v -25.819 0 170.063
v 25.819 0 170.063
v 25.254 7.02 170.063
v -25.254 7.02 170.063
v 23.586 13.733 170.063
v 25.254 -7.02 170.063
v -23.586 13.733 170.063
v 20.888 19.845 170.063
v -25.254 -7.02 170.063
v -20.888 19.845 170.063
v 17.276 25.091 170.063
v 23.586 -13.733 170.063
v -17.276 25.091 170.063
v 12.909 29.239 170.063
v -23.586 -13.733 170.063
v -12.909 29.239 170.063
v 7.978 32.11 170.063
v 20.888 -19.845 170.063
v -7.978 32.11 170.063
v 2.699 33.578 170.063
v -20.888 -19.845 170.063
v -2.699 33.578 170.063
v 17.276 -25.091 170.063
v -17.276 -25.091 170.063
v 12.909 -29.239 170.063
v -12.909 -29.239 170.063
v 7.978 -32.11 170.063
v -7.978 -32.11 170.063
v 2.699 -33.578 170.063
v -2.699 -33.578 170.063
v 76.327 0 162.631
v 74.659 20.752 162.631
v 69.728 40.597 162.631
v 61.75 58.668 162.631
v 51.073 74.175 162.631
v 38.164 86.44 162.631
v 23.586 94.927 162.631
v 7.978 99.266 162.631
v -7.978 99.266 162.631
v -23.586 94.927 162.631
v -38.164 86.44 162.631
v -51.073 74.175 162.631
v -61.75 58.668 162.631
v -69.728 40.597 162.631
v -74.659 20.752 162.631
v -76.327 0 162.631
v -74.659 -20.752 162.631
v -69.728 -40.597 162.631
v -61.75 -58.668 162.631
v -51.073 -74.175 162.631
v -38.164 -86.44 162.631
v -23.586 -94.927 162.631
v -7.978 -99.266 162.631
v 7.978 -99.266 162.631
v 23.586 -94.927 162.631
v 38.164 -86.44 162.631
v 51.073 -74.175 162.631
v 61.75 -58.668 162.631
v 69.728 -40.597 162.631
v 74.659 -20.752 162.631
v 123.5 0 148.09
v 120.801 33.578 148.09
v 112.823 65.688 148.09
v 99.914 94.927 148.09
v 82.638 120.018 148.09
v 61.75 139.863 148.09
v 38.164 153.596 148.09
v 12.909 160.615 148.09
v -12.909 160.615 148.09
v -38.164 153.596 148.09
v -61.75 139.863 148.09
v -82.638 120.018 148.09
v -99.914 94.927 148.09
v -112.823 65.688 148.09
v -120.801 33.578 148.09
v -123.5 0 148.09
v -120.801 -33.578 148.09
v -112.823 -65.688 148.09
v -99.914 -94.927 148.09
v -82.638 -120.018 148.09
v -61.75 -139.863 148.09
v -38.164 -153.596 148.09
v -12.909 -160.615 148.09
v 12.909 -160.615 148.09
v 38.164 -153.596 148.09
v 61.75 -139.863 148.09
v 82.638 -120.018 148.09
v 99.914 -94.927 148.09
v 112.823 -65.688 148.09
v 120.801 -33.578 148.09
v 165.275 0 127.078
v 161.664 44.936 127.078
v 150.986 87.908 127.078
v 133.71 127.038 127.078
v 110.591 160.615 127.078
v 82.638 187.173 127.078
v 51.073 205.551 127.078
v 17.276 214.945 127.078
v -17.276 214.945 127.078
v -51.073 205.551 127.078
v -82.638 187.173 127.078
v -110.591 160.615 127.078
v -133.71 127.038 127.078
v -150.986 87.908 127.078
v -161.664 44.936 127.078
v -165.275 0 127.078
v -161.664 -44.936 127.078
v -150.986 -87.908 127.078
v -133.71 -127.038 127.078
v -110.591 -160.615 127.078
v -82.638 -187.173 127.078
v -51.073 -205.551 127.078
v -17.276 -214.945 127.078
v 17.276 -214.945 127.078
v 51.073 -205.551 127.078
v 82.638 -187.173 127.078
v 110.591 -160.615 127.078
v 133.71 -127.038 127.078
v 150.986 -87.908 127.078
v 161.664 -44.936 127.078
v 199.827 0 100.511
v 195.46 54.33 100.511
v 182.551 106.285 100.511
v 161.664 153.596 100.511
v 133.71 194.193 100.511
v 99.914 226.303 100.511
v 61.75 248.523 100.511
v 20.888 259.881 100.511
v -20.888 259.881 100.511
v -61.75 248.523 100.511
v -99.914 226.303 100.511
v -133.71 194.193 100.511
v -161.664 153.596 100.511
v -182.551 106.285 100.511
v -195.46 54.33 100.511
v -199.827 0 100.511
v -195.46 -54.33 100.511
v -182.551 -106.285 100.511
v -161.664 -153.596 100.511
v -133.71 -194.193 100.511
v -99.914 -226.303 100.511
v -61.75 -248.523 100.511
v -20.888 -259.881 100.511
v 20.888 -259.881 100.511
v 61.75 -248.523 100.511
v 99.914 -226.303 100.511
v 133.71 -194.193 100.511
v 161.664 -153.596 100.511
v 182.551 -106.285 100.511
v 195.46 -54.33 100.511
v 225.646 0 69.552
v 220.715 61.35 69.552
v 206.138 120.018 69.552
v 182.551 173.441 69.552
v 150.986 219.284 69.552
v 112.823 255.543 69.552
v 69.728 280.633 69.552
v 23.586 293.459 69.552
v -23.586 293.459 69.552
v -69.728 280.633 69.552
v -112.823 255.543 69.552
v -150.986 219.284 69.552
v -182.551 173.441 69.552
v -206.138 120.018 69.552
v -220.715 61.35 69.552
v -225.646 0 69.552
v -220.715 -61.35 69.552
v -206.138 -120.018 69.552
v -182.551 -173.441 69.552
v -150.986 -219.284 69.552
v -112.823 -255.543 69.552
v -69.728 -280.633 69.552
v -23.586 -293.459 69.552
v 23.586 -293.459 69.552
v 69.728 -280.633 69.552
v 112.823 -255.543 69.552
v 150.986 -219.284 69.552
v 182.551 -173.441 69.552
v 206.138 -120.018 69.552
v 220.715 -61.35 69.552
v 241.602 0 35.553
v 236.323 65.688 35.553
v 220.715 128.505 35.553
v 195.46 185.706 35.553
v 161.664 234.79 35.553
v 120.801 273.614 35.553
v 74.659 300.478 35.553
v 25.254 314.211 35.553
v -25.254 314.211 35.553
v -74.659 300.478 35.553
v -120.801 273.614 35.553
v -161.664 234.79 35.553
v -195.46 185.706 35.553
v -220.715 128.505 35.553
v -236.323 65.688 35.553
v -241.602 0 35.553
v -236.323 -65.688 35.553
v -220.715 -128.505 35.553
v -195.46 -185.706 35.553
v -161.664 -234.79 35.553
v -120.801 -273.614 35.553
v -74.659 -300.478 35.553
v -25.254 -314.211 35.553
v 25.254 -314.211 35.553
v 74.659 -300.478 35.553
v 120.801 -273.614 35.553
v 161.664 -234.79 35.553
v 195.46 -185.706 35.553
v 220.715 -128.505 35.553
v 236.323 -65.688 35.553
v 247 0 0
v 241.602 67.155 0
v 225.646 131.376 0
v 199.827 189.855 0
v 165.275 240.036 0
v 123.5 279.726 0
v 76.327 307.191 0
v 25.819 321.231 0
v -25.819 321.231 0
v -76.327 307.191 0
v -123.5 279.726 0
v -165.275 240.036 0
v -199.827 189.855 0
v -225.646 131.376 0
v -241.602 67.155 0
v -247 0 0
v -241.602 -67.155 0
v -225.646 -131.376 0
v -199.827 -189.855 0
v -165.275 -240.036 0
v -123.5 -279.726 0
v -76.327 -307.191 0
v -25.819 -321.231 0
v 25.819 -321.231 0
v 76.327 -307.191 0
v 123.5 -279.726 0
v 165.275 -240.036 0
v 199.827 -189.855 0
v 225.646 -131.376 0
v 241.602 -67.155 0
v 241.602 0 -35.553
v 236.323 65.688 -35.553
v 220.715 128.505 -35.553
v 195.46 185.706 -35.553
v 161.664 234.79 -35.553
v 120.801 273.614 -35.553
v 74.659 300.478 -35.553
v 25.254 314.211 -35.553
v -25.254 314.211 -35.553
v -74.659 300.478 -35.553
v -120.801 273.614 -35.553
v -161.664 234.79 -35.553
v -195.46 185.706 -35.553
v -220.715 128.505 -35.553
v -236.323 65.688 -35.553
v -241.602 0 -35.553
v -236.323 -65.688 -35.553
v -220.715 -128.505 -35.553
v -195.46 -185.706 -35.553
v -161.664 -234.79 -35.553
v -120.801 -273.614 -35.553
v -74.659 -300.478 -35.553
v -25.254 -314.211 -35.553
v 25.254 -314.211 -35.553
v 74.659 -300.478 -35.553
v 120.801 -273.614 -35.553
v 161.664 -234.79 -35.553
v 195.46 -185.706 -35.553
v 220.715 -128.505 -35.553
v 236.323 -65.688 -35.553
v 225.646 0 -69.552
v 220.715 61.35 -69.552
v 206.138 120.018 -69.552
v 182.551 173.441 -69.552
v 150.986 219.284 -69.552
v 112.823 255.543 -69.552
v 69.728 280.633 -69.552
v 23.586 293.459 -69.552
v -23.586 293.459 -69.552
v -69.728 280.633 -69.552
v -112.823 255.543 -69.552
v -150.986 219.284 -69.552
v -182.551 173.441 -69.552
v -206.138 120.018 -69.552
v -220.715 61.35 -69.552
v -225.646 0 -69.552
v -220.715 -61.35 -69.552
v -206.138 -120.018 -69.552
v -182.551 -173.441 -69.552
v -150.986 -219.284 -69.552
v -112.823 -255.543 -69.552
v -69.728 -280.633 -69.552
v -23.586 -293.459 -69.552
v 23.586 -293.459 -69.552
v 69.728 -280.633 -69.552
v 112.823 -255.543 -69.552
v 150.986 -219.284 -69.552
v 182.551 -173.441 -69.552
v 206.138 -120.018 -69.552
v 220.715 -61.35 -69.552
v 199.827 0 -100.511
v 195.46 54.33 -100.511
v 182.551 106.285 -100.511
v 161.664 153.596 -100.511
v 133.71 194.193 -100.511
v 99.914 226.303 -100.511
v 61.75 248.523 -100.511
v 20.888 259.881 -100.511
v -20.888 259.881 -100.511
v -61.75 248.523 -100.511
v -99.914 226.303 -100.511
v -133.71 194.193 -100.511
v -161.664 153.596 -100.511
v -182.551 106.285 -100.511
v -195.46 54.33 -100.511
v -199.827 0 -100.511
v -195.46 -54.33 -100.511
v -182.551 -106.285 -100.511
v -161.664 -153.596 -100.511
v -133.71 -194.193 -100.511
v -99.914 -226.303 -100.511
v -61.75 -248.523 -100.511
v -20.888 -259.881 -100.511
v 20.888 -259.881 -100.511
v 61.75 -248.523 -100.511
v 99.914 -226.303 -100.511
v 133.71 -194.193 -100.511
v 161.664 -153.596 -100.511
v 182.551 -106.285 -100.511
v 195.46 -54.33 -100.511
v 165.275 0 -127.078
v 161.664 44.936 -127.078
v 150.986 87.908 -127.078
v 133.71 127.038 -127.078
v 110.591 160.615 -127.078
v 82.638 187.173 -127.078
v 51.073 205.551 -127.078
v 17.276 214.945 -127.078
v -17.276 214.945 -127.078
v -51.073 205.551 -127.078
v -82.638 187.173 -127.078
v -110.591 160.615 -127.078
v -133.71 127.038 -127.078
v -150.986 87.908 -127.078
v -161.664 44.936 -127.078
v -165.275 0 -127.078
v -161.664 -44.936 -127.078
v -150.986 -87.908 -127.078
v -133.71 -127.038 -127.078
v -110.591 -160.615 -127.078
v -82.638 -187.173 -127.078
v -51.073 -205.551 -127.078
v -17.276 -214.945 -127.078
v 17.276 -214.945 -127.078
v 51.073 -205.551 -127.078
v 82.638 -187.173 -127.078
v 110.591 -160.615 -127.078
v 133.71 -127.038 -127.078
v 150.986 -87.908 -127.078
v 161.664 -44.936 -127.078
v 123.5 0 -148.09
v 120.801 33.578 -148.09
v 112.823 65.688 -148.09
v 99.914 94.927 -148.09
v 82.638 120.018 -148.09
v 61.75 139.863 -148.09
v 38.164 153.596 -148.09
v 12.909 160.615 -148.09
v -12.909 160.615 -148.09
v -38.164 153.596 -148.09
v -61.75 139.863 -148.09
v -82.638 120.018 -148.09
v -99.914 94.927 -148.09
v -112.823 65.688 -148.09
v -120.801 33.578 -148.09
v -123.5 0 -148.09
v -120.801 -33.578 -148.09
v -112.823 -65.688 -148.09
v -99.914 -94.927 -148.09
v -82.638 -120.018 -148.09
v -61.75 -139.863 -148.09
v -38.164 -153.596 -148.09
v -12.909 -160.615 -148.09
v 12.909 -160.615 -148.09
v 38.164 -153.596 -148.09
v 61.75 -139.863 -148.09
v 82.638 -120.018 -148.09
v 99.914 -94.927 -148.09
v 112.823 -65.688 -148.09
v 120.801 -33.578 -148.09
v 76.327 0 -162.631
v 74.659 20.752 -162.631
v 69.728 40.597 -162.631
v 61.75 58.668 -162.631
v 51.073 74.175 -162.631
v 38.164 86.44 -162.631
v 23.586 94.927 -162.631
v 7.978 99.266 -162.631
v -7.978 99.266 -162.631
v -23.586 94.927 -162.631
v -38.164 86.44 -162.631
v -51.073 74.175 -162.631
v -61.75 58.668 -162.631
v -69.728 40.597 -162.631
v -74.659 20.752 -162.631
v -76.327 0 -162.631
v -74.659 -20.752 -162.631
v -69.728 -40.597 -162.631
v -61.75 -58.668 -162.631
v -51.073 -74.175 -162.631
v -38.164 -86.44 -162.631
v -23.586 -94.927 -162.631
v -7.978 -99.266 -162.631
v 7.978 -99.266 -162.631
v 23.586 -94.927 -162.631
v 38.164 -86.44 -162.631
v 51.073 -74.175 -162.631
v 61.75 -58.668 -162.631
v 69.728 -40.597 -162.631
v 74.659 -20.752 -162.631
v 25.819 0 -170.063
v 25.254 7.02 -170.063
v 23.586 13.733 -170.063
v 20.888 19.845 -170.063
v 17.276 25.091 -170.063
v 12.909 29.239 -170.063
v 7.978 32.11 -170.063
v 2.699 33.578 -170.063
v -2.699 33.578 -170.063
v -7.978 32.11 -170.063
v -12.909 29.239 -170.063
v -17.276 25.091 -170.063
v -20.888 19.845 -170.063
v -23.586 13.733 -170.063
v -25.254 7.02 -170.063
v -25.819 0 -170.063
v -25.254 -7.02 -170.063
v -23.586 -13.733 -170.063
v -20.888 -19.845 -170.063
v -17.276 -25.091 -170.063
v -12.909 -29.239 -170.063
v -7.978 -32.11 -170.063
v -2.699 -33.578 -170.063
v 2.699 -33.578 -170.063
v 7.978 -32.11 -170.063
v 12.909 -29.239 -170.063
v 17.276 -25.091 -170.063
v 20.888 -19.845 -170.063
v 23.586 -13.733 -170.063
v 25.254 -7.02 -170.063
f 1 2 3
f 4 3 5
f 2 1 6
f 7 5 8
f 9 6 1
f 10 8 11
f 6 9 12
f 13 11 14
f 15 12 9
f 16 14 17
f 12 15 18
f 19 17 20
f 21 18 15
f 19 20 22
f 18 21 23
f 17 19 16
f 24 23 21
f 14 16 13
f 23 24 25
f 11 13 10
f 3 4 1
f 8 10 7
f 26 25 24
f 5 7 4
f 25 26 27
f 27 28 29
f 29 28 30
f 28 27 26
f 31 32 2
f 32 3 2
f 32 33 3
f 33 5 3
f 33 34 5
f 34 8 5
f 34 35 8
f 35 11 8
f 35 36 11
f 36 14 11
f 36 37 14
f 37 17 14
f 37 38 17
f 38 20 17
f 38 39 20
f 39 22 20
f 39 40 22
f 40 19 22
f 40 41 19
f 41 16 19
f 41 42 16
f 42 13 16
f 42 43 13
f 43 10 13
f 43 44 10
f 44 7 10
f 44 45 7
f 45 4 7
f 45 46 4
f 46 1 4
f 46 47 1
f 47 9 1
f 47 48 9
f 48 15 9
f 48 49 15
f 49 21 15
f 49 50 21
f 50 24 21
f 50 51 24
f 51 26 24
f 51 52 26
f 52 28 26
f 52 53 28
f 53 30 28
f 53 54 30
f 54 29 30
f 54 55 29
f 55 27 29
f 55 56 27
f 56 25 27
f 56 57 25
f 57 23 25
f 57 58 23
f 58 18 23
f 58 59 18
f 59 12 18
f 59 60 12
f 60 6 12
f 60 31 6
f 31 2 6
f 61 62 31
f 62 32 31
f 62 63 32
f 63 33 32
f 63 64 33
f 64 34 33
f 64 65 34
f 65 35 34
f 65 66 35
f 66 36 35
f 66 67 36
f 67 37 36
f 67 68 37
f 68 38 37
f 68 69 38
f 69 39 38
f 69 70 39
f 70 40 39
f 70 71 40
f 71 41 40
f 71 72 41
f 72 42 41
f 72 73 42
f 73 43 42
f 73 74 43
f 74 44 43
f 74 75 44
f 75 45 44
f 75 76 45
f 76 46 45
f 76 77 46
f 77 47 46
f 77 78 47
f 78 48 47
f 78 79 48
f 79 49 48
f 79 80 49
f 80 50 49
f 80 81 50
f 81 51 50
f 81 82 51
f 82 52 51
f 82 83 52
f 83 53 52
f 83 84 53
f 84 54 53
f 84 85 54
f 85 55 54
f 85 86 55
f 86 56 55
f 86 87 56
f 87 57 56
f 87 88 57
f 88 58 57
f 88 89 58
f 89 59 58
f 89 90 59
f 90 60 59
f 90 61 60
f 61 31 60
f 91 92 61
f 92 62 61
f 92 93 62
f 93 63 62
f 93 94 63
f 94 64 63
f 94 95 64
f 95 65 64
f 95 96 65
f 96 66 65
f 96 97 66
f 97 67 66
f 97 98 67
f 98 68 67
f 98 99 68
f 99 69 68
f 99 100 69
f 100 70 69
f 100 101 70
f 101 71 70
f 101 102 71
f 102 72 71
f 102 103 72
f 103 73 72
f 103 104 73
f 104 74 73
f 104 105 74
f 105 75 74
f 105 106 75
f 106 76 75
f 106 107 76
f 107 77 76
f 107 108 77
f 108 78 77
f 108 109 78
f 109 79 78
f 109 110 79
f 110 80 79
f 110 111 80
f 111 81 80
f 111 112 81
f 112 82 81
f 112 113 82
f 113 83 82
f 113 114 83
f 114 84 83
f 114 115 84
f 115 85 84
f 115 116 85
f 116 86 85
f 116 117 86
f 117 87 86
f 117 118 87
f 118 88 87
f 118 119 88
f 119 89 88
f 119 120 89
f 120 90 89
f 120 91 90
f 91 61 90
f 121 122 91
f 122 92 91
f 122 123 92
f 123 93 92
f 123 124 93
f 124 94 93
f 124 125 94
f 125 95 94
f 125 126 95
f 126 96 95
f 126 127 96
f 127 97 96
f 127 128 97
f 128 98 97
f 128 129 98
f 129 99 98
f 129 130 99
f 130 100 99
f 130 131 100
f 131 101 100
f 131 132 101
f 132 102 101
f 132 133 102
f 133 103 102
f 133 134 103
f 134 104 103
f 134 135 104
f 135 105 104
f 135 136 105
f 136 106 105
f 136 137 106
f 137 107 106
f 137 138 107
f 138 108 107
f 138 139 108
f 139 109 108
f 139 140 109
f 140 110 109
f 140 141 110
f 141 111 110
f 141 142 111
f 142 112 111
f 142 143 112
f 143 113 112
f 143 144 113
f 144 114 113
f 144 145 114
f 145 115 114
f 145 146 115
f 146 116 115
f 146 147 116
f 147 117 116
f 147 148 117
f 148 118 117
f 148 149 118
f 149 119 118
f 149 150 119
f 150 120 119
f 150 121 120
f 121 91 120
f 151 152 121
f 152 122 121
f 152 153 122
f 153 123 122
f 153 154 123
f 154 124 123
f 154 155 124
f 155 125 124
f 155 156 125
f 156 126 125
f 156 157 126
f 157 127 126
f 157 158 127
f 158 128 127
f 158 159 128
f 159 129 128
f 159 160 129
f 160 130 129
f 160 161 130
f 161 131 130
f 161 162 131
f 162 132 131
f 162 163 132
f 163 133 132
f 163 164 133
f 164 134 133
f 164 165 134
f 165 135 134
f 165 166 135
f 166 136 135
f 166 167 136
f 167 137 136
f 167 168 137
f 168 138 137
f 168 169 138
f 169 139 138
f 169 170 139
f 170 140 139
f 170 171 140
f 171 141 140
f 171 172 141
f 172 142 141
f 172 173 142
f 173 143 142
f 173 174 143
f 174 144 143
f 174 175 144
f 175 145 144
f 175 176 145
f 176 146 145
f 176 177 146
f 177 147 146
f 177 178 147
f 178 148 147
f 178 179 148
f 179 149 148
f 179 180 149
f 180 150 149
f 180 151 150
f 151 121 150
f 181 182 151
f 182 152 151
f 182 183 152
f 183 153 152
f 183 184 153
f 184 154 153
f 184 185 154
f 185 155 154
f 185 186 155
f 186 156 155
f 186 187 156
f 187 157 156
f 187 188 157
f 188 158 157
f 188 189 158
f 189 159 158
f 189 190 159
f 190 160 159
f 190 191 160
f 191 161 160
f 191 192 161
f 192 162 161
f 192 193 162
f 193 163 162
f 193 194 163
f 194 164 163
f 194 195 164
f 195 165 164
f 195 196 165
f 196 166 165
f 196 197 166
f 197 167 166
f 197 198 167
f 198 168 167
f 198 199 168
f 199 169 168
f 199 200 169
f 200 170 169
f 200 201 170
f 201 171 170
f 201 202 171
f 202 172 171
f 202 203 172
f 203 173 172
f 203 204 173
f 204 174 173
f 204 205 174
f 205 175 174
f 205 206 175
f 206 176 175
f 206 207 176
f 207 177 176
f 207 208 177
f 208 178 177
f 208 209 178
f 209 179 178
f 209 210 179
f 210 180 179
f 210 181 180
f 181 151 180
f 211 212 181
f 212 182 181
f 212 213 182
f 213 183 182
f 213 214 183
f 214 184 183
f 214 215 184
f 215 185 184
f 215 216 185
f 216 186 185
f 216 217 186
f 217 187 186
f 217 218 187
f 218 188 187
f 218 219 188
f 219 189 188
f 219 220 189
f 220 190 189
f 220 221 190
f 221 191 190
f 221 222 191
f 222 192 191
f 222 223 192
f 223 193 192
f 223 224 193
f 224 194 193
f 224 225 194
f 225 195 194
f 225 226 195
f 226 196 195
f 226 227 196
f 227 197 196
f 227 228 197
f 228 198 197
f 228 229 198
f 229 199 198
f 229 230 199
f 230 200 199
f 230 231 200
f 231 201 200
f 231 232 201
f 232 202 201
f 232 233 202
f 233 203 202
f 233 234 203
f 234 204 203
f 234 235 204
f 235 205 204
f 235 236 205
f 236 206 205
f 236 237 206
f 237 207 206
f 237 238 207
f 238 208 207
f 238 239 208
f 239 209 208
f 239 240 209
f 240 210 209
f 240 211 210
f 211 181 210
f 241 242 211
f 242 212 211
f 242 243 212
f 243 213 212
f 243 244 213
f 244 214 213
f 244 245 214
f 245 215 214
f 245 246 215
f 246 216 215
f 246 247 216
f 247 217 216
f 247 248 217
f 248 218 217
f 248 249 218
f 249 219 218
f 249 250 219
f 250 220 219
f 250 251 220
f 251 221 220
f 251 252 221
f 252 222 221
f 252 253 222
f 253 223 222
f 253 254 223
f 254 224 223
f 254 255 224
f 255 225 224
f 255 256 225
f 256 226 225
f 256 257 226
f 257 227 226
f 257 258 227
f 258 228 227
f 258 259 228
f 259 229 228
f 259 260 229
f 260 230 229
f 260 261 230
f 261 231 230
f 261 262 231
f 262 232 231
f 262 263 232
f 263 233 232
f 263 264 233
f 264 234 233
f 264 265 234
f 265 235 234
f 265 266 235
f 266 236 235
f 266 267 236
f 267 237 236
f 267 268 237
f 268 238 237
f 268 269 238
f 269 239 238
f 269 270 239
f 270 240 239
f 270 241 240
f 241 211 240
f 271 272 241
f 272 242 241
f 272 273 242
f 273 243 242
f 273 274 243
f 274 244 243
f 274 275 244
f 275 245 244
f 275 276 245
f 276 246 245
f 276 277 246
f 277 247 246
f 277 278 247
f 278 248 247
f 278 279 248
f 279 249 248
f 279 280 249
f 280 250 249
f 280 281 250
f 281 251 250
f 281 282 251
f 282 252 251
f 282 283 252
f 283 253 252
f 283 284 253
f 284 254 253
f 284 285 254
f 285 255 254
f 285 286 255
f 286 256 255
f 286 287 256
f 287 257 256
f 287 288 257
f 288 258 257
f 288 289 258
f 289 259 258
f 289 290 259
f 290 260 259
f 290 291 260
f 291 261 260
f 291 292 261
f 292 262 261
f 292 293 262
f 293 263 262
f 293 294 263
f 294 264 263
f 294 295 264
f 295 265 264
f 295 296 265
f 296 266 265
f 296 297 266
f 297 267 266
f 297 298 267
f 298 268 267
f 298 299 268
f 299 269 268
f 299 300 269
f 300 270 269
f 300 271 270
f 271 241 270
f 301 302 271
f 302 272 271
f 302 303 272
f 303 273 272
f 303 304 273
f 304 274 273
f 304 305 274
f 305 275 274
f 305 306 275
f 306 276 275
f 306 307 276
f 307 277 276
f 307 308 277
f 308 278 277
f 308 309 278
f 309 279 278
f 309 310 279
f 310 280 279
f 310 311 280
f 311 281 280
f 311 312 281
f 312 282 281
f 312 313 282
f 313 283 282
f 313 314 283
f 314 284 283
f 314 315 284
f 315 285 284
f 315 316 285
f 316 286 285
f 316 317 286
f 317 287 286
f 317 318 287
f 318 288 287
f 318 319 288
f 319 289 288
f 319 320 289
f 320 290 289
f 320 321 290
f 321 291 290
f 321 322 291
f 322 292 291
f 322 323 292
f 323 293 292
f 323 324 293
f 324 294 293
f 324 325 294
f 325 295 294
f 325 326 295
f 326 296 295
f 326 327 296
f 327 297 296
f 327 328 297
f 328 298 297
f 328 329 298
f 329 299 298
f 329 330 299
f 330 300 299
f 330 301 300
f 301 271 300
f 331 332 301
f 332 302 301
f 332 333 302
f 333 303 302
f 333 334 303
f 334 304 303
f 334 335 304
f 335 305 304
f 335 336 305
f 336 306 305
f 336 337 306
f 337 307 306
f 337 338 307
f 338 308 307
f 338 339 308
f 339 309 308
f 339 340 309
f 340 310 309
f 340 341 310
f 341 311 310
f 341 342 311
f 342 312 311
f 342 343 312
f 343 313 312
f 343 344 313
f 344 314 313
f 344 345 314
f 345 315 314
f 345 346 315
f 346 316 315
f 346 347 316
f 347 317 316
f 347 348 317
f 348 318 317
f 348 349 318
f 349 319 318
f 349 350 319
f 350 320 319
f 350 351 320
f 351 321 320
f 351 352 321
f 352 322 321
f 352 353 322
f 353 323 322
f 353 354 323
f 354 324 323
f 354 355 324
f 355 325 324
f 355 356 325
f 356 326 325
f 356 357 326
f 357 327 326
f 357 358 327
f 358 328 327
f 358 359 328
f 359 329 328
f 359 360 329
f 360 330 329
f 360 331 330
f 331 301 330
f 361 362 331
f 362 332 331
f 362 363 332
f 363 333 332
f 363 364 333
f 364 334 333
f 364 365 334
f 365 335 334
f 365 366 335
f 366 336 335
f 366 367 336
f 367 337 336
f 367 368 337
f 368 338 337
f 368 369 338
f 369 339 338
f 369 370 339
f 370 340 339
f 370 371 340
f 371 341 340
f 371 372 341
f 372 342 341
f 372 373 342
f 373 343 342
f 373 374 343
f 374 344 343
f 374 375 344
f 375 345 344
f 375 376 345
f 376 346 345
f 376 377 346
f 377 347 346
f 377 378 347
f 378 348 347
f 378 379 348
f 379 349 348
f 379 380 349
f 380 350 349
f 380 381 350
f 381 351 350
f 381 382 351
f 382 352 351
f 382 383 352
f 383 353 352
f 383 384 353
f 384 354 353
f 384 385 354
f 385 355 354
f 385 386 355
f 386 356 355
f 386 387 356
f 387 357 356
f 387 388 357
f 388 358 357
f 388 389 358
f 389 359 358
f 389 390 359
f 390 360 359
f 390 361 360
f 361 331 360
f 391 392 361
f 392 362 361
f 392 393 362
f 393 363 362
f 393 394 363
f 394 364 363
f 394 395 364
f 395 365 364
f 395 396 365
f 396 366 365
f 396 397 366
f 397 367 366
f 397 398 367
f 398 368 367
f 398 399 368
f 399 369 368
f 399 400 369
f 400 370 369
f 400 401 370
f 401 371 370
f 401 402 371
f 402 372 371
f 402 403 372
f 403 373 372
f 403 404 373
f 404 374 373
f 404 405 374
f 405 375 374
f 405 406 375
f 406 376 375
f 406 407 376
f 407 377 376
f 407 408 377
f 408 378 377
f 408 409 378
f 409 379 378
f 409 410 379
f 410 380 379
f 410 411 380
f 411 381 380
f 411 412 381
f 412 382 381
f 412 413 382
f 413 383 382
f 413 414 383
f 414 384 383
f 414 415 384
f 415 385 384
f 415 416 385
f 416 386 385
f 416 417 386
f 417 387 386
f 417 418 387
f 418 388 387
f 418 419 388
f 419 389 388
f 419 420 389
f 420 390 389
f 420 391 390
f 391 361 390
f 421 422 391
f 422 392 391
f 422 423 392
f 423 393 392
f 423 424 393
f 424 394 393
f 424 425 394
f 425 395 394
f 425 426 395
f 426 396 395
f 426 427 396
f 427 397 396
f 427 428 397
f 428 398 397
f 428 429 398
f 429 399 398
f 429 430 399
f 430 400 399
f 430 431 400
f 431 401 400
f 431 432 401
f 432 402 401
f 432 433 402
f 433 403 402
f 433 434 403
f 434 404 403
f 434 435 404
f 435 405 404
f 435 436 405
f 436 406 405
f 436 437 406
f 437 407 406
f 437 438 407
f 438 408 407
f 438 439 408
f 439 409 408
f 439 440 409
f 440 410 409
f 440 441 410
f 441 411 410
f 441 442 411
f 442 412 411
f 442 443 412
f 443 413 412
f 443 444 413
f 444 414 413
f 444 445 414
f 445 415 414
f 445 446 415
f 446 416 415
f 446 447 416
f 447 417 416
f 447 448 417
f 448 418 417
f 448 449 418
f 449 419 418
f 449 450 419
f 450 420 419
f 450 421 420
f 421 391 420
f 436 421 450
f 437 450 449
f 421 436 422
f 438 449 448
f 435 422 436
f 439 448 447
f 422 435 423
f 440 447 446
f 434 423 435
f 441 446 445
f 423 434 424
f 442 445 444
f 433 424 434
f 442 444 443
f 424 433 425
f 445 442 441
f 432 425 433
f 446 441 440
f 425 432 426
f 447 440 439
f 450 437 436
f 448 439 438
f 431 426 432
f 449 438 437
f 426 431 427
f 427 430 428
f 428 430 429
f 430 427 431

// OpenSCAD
// Generated by SolidPython 1.0.1 on 2020-07-29 00:46:51


scale(v = [13, 17, 9]) {
	sphere(r = 19);
}
/***********************************************
*********      SolidPython code:      **********
************************************************
 
# import packages: SolidPython
from solid import *
from solid.utils import *
from itertools import chain, combinations, permutations


class Resize:

    def __init__(self, scad_file):
        self.scad_file = scad_file
        #self.scad_file = import_scad(scad_file)
        # cone/cylinder param:
        self.r1 = 0
        self.r2 = 0
        self.h = 0
        # rectangular prism param:
        self.w = 0
        self.l = 0
        # ellipse param:
        self.r = 0

    # import OpenScad code (file name corresponds to shape)


    # classify shape + parameters
    def assign(self, param1, param2, param3):
        if self.scad_file == 'cone.scad':
            self.r1 = param1
            self.r2 = param2
            self.h = param3
        elif self.scad_file == 'cylinder.scad':
            self.r1 = param1
            self.r2 = param2
            self.h = param3
        elif self.scad_file == 'rectangularPrism.scad':
            self.h = param1
            self.l = param2
            self.w = param3
        else:
            self.r = param1
            self.h = param2

    # resize parameters
    def iterate(self):
        x = range(3, 20, 2)
        i = 1
        if self.scad_file == 'cone.scad':
            tempList = list(permutations(x, 2))
            for temp in tempList:
                param1 = temp[0]
                param2 = temp[1]
                filepath = 'produced_scad_files/' + 'cone' + str(param1) + '_' + str(param2) + '_' + '.scad'
                scad_render_to_file(cylinder(h=param1, r1=param2, r2=0), filepath)

        elif self.scad_file == 'cylinder.scad':
            tempList = list(permutations(x, 3))
            for temp in tempList:
                param1 = temp[0]
                param2 = temp[1]
                filepath = 'produced_scad_files/' + 'cylinder' + str(param1) + '_' + str(param2) + '_' + '.scad'
                scad_render_to_file(cylinder(h=param1, r1=param2, r2=param2), filepath)

        elif self.scad_file == 'rectangularPrism.scad':
            tempList = list(permutations(x, 3))
            for temp in tempList:
                param1 = temp[0]
                param2 = temp[1]
                param3 = temp[2]
                filepath = 'produced_scad_files/' + 'rectangularPrism' + str(param1) + '_' + str(param2) + '_' + str(
                    param3) + '.scad'
                scad_render_to_file(cube(size=(param1, param2, param3)), filepath)

        elif self.scad_file == 'ellipse.scad':
            tempList = list(permutations(x, 4))
            for temp in tempList:
                param1 = temp[0]
                param2 = temp[1]
                param3 = temp[2]
                param4 = temp[3]
                filepath = 'produced_scad_files/' + 'ellipse' + str(param1) + '_' + str(param2) + '_' + str(param3) + '_' + str(param4) + '.scad'
                scad_render_to_file(scale([param1, param2, param3])(sphere(r=param4)), filepath)

    def render_to_scadfile(self):
        scad_render_to_file(scad, 'example.scad') 
 
************************************************/
